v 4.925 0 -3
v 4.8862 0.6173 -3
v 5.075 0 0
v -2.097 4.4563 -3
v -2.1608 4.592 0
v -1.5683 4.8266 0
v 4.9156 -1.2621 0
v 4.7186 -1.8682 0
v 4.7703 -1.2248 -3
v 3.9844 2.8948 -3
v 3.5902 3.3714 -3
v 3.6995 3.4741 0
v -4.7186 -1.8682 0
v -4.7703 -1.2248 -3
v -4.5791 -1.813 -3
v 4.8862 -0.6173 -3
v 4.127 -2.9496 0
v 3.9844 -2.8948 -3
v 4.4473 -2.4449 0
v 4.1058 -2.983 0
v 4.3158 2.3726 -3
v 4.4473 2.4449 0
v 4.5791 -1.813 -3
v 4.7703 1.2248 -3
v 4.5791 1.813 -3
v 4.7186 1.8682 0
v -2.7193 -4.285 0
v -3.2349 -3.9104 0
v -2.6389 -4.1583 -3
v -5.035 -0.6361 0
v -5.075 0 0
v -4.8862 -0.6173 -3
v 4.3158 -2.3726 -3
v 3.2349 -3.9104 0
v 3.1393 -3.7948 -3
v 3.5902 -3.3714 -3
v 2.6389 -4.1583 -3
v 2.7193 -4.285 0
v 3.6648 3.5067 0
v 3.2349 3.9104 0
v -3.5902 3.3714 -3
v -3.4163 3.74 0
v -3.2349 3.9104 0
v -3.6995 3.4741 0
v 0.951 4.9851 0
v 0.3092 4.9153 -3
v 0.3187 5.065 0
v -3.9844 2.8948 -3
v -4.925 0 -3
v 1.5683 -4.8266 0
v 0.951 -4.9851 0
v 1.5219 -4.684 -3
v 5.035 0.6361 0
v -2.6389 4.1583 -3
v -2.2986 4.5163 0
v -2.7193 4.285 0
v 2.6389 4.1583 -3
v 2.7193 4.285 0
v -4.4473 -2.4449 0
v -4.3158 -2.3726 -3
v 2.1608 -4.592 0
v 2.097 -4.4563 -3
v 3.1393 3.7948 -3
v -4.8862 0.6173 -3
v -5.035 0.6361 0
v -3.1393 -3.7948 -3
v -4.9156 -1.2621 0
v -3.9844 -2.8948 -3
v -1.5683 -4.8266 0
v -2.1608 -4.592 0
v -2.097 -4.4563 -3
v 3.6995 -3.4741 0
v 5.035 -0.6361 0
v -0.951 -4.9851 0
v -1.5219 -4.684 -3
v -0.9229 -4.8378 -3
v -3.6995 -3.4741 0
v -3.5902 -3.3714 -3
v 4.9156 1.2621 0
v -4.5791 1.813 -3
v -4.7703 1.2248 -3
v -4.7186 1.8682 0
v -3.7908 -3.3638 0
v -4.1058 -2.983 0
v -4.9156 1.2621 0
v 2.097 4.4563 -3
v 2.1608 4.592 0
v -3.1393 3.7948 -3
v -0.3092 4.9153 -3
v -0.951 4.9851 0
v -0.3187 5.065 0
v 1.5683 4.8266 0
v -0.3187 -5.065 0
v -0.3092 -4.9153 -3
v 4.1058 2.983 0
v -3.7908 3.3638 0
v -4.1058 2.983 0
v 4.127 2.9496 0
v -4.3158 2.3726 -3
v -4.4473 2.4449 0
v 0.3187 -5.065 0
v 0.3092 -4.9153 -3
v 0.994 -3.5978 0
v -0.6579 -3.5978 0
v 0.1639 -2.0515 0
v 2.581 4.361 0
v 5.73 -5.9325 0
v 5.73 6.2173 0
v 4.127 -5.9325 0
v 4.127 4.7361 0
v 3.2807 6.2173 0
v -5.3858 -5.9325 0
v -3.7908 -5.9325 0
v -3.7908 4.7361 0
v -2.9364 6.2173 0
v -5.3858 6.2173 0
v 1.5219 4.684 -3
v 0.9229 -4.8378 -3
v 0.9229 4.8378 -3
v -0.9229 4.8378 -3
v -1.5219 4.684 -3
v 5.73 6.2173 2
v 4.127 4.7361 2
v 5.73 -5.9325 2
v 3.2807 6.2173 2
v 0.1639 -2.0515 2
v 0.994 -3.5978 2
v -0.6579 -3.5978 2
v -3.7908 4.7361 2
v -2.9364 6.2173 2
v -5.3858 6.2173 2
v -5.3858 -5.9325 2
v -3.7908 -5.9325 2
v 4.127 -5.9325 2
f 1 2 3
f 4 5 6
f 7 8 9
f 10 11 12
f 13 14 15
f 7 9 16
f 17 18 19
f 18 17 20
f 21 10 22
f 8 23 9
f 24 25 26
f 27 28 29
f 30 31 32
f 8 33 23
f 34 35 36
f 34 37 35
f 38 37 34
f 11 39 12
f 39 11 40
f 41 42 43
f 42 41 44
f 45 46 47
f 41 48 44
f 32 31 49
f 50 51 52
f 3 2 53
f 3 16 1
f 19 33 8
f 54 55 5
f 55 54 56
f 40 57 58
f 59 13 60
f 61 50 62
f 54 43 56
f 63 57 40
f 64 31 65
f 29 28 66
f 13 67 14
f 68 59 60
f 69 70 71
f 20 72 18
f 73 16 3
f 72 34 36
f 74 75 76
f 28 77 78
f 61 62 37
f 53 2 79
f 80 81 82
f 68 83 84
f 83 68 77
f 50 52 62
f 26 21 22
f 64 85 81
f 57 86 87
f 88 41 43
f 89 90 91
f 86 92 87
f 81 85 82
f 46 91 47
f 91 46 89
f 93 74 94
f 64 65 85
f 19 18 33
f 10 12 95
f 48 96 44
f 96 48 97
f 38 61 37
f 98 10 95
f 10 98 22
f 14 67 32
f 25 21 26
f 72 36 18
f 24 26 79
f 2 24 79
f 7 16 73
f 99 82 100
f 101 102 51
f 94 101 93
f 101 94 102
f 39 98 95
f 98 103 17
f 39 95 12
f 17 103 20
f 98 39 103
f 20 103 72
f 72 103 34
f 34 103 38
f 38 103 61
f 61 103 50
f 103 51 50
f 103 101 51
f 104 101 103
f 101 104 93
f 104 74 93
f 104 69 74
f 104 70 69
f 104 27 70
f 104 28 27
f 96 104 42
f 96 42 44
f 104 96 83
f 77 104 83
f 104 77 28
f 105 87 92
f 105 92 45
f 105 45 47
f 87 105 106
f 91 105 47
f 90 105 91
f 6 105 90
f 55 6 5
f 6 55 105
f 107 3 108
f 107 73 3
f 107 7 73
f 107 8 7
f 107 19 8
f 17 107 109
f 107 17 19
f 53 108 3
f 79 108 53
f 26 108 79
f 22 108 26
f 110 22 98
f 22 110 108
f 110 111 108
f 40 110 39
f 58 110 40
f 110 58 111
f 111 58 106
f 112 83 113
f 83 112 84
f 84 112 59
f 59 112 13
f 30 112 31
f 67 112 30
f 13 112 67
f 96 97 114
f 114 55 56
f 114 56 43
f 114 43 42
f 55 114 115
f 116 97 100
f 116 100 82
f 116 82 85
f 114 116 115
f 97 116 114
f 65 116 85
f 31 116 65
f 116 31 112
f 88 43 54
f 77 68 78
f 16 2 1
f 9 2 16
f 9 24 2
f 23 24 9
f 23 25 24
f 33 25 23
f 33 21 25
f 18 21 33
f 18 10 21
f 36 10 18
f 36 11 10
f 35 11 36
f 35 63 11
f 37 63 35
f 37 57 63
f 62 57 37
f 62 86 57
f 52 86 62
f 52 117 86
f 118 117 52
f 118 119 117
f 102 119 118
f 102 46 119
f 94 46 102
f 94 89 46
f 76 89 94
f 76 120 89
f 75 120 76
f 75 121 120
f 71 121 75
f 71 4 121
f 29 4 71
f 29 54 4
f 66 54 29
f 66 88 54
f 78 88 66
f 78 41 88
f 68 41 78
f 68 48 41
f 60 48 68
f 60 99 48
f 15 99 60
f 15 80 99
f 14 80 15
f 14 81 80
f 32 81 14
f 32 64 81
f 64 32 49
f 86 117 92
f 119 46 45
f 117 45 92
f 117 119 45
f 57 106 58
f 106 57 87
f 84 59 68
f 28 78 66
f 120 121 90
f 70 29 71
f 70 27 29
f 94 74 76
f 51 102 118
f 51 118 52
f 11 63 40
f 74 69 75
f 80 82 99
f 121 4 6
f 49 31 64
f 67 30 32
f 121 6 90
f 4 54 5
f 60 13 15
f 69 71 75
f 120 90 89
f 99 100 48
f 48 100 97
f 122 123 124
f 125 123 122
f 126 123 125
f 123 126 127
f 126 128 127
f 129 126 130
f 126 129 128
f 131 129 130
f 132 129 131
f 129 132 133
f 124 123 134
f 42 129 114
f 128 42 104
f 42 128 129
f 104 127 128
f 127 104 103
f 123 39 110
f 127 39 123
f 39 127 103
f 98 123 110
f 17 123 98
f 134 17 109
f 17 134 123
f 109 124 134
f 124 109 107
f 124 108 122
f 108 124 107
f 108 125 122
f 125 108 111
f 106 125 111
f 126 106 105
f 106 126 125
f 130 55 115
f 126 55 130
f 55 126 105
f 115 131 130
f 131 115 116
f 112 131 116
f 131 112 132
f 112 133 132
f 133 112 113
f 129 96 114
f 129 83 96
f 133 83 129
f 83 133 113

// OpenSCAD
$fn = 50;

difference() {
	union() {
		translate(v = [0, 0, -3.0]) {
			cylinder(h = 3, r1 = 4.925, r2 = 5.075);
		}
		linear_extrude(height = 2) {
			text(font = "Impact", halign = "center", size = 12, text = "M", valign = "center");
		}
	}
	union();
}
